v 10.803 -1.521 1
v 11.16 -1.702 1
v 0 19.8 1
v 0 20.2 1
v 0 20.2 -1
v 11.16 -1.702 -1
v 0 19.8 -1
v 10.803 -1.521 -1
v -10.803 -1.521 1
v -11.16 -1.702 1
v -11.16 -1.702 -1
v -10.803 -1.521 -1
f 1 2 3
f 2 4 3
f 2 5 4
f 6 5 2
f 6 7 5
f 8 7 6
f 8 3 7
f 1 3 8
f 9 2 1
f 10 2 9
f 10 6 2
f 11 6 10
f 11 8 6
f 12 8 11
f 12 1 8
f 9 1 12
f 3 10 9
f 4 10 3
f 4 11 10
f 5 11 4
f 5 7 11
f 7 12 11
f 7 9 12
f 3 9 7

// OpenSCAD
// This test contains a manually extruded shape where the
// start and end vertices touches with identical coordinates.
polyhedron(points = [
  [2.02196e-17, 19.8, 1],
  [-2.02196e-17, 20.2, 1],
  [-2.02196e-17, 20.2, -1],
  [2.02196e-17, 19.8, -1],
  [10.8034, -1.52112, 1],
  [11.16, -1.70232, 1],
  [11.16, -1.70232, -1],
  [10.8034, -1.52112, -1],
  [-10.8034, -1.52112, 1],
  [-11.16, -1.70232, 1],
  [-11.16, -1.70232, -1],
  [-10.8034, -1.52112, -1],
  [2.02196e-17, 19.8, 1],
  [-2.02196e-17, 20.2, 1],
  [-2.02196e-17, 20.2, -1],
  [2.02196e-17, 19.8, -1]
],
  faces = [[0, 5, 4],
  [0, 1, 5],
  [1, 2, 5],
  [5, 2, 6],
  [2, 3, 6],
  [6, 3, 7],
  [3, 0, 7],
  [7, 0, 4],
  [4, 5, 8],
  [8, 5, 9],
  [5, 6, 9],
  [9, 6, 10],
  [6, 7, 10],
  [10, 7, 11],
  [7, 4, 11],
  [11, 4, 8],
  [8, 9, 12],
  [12, 9, 13],
  [9, 10, 13],
  [13, 10, 14],
  [10, 15, 14],
  [10, 11, 15],
  [11, 8, 15],
  [15, 8, 12]
],
  convexity = 2);
